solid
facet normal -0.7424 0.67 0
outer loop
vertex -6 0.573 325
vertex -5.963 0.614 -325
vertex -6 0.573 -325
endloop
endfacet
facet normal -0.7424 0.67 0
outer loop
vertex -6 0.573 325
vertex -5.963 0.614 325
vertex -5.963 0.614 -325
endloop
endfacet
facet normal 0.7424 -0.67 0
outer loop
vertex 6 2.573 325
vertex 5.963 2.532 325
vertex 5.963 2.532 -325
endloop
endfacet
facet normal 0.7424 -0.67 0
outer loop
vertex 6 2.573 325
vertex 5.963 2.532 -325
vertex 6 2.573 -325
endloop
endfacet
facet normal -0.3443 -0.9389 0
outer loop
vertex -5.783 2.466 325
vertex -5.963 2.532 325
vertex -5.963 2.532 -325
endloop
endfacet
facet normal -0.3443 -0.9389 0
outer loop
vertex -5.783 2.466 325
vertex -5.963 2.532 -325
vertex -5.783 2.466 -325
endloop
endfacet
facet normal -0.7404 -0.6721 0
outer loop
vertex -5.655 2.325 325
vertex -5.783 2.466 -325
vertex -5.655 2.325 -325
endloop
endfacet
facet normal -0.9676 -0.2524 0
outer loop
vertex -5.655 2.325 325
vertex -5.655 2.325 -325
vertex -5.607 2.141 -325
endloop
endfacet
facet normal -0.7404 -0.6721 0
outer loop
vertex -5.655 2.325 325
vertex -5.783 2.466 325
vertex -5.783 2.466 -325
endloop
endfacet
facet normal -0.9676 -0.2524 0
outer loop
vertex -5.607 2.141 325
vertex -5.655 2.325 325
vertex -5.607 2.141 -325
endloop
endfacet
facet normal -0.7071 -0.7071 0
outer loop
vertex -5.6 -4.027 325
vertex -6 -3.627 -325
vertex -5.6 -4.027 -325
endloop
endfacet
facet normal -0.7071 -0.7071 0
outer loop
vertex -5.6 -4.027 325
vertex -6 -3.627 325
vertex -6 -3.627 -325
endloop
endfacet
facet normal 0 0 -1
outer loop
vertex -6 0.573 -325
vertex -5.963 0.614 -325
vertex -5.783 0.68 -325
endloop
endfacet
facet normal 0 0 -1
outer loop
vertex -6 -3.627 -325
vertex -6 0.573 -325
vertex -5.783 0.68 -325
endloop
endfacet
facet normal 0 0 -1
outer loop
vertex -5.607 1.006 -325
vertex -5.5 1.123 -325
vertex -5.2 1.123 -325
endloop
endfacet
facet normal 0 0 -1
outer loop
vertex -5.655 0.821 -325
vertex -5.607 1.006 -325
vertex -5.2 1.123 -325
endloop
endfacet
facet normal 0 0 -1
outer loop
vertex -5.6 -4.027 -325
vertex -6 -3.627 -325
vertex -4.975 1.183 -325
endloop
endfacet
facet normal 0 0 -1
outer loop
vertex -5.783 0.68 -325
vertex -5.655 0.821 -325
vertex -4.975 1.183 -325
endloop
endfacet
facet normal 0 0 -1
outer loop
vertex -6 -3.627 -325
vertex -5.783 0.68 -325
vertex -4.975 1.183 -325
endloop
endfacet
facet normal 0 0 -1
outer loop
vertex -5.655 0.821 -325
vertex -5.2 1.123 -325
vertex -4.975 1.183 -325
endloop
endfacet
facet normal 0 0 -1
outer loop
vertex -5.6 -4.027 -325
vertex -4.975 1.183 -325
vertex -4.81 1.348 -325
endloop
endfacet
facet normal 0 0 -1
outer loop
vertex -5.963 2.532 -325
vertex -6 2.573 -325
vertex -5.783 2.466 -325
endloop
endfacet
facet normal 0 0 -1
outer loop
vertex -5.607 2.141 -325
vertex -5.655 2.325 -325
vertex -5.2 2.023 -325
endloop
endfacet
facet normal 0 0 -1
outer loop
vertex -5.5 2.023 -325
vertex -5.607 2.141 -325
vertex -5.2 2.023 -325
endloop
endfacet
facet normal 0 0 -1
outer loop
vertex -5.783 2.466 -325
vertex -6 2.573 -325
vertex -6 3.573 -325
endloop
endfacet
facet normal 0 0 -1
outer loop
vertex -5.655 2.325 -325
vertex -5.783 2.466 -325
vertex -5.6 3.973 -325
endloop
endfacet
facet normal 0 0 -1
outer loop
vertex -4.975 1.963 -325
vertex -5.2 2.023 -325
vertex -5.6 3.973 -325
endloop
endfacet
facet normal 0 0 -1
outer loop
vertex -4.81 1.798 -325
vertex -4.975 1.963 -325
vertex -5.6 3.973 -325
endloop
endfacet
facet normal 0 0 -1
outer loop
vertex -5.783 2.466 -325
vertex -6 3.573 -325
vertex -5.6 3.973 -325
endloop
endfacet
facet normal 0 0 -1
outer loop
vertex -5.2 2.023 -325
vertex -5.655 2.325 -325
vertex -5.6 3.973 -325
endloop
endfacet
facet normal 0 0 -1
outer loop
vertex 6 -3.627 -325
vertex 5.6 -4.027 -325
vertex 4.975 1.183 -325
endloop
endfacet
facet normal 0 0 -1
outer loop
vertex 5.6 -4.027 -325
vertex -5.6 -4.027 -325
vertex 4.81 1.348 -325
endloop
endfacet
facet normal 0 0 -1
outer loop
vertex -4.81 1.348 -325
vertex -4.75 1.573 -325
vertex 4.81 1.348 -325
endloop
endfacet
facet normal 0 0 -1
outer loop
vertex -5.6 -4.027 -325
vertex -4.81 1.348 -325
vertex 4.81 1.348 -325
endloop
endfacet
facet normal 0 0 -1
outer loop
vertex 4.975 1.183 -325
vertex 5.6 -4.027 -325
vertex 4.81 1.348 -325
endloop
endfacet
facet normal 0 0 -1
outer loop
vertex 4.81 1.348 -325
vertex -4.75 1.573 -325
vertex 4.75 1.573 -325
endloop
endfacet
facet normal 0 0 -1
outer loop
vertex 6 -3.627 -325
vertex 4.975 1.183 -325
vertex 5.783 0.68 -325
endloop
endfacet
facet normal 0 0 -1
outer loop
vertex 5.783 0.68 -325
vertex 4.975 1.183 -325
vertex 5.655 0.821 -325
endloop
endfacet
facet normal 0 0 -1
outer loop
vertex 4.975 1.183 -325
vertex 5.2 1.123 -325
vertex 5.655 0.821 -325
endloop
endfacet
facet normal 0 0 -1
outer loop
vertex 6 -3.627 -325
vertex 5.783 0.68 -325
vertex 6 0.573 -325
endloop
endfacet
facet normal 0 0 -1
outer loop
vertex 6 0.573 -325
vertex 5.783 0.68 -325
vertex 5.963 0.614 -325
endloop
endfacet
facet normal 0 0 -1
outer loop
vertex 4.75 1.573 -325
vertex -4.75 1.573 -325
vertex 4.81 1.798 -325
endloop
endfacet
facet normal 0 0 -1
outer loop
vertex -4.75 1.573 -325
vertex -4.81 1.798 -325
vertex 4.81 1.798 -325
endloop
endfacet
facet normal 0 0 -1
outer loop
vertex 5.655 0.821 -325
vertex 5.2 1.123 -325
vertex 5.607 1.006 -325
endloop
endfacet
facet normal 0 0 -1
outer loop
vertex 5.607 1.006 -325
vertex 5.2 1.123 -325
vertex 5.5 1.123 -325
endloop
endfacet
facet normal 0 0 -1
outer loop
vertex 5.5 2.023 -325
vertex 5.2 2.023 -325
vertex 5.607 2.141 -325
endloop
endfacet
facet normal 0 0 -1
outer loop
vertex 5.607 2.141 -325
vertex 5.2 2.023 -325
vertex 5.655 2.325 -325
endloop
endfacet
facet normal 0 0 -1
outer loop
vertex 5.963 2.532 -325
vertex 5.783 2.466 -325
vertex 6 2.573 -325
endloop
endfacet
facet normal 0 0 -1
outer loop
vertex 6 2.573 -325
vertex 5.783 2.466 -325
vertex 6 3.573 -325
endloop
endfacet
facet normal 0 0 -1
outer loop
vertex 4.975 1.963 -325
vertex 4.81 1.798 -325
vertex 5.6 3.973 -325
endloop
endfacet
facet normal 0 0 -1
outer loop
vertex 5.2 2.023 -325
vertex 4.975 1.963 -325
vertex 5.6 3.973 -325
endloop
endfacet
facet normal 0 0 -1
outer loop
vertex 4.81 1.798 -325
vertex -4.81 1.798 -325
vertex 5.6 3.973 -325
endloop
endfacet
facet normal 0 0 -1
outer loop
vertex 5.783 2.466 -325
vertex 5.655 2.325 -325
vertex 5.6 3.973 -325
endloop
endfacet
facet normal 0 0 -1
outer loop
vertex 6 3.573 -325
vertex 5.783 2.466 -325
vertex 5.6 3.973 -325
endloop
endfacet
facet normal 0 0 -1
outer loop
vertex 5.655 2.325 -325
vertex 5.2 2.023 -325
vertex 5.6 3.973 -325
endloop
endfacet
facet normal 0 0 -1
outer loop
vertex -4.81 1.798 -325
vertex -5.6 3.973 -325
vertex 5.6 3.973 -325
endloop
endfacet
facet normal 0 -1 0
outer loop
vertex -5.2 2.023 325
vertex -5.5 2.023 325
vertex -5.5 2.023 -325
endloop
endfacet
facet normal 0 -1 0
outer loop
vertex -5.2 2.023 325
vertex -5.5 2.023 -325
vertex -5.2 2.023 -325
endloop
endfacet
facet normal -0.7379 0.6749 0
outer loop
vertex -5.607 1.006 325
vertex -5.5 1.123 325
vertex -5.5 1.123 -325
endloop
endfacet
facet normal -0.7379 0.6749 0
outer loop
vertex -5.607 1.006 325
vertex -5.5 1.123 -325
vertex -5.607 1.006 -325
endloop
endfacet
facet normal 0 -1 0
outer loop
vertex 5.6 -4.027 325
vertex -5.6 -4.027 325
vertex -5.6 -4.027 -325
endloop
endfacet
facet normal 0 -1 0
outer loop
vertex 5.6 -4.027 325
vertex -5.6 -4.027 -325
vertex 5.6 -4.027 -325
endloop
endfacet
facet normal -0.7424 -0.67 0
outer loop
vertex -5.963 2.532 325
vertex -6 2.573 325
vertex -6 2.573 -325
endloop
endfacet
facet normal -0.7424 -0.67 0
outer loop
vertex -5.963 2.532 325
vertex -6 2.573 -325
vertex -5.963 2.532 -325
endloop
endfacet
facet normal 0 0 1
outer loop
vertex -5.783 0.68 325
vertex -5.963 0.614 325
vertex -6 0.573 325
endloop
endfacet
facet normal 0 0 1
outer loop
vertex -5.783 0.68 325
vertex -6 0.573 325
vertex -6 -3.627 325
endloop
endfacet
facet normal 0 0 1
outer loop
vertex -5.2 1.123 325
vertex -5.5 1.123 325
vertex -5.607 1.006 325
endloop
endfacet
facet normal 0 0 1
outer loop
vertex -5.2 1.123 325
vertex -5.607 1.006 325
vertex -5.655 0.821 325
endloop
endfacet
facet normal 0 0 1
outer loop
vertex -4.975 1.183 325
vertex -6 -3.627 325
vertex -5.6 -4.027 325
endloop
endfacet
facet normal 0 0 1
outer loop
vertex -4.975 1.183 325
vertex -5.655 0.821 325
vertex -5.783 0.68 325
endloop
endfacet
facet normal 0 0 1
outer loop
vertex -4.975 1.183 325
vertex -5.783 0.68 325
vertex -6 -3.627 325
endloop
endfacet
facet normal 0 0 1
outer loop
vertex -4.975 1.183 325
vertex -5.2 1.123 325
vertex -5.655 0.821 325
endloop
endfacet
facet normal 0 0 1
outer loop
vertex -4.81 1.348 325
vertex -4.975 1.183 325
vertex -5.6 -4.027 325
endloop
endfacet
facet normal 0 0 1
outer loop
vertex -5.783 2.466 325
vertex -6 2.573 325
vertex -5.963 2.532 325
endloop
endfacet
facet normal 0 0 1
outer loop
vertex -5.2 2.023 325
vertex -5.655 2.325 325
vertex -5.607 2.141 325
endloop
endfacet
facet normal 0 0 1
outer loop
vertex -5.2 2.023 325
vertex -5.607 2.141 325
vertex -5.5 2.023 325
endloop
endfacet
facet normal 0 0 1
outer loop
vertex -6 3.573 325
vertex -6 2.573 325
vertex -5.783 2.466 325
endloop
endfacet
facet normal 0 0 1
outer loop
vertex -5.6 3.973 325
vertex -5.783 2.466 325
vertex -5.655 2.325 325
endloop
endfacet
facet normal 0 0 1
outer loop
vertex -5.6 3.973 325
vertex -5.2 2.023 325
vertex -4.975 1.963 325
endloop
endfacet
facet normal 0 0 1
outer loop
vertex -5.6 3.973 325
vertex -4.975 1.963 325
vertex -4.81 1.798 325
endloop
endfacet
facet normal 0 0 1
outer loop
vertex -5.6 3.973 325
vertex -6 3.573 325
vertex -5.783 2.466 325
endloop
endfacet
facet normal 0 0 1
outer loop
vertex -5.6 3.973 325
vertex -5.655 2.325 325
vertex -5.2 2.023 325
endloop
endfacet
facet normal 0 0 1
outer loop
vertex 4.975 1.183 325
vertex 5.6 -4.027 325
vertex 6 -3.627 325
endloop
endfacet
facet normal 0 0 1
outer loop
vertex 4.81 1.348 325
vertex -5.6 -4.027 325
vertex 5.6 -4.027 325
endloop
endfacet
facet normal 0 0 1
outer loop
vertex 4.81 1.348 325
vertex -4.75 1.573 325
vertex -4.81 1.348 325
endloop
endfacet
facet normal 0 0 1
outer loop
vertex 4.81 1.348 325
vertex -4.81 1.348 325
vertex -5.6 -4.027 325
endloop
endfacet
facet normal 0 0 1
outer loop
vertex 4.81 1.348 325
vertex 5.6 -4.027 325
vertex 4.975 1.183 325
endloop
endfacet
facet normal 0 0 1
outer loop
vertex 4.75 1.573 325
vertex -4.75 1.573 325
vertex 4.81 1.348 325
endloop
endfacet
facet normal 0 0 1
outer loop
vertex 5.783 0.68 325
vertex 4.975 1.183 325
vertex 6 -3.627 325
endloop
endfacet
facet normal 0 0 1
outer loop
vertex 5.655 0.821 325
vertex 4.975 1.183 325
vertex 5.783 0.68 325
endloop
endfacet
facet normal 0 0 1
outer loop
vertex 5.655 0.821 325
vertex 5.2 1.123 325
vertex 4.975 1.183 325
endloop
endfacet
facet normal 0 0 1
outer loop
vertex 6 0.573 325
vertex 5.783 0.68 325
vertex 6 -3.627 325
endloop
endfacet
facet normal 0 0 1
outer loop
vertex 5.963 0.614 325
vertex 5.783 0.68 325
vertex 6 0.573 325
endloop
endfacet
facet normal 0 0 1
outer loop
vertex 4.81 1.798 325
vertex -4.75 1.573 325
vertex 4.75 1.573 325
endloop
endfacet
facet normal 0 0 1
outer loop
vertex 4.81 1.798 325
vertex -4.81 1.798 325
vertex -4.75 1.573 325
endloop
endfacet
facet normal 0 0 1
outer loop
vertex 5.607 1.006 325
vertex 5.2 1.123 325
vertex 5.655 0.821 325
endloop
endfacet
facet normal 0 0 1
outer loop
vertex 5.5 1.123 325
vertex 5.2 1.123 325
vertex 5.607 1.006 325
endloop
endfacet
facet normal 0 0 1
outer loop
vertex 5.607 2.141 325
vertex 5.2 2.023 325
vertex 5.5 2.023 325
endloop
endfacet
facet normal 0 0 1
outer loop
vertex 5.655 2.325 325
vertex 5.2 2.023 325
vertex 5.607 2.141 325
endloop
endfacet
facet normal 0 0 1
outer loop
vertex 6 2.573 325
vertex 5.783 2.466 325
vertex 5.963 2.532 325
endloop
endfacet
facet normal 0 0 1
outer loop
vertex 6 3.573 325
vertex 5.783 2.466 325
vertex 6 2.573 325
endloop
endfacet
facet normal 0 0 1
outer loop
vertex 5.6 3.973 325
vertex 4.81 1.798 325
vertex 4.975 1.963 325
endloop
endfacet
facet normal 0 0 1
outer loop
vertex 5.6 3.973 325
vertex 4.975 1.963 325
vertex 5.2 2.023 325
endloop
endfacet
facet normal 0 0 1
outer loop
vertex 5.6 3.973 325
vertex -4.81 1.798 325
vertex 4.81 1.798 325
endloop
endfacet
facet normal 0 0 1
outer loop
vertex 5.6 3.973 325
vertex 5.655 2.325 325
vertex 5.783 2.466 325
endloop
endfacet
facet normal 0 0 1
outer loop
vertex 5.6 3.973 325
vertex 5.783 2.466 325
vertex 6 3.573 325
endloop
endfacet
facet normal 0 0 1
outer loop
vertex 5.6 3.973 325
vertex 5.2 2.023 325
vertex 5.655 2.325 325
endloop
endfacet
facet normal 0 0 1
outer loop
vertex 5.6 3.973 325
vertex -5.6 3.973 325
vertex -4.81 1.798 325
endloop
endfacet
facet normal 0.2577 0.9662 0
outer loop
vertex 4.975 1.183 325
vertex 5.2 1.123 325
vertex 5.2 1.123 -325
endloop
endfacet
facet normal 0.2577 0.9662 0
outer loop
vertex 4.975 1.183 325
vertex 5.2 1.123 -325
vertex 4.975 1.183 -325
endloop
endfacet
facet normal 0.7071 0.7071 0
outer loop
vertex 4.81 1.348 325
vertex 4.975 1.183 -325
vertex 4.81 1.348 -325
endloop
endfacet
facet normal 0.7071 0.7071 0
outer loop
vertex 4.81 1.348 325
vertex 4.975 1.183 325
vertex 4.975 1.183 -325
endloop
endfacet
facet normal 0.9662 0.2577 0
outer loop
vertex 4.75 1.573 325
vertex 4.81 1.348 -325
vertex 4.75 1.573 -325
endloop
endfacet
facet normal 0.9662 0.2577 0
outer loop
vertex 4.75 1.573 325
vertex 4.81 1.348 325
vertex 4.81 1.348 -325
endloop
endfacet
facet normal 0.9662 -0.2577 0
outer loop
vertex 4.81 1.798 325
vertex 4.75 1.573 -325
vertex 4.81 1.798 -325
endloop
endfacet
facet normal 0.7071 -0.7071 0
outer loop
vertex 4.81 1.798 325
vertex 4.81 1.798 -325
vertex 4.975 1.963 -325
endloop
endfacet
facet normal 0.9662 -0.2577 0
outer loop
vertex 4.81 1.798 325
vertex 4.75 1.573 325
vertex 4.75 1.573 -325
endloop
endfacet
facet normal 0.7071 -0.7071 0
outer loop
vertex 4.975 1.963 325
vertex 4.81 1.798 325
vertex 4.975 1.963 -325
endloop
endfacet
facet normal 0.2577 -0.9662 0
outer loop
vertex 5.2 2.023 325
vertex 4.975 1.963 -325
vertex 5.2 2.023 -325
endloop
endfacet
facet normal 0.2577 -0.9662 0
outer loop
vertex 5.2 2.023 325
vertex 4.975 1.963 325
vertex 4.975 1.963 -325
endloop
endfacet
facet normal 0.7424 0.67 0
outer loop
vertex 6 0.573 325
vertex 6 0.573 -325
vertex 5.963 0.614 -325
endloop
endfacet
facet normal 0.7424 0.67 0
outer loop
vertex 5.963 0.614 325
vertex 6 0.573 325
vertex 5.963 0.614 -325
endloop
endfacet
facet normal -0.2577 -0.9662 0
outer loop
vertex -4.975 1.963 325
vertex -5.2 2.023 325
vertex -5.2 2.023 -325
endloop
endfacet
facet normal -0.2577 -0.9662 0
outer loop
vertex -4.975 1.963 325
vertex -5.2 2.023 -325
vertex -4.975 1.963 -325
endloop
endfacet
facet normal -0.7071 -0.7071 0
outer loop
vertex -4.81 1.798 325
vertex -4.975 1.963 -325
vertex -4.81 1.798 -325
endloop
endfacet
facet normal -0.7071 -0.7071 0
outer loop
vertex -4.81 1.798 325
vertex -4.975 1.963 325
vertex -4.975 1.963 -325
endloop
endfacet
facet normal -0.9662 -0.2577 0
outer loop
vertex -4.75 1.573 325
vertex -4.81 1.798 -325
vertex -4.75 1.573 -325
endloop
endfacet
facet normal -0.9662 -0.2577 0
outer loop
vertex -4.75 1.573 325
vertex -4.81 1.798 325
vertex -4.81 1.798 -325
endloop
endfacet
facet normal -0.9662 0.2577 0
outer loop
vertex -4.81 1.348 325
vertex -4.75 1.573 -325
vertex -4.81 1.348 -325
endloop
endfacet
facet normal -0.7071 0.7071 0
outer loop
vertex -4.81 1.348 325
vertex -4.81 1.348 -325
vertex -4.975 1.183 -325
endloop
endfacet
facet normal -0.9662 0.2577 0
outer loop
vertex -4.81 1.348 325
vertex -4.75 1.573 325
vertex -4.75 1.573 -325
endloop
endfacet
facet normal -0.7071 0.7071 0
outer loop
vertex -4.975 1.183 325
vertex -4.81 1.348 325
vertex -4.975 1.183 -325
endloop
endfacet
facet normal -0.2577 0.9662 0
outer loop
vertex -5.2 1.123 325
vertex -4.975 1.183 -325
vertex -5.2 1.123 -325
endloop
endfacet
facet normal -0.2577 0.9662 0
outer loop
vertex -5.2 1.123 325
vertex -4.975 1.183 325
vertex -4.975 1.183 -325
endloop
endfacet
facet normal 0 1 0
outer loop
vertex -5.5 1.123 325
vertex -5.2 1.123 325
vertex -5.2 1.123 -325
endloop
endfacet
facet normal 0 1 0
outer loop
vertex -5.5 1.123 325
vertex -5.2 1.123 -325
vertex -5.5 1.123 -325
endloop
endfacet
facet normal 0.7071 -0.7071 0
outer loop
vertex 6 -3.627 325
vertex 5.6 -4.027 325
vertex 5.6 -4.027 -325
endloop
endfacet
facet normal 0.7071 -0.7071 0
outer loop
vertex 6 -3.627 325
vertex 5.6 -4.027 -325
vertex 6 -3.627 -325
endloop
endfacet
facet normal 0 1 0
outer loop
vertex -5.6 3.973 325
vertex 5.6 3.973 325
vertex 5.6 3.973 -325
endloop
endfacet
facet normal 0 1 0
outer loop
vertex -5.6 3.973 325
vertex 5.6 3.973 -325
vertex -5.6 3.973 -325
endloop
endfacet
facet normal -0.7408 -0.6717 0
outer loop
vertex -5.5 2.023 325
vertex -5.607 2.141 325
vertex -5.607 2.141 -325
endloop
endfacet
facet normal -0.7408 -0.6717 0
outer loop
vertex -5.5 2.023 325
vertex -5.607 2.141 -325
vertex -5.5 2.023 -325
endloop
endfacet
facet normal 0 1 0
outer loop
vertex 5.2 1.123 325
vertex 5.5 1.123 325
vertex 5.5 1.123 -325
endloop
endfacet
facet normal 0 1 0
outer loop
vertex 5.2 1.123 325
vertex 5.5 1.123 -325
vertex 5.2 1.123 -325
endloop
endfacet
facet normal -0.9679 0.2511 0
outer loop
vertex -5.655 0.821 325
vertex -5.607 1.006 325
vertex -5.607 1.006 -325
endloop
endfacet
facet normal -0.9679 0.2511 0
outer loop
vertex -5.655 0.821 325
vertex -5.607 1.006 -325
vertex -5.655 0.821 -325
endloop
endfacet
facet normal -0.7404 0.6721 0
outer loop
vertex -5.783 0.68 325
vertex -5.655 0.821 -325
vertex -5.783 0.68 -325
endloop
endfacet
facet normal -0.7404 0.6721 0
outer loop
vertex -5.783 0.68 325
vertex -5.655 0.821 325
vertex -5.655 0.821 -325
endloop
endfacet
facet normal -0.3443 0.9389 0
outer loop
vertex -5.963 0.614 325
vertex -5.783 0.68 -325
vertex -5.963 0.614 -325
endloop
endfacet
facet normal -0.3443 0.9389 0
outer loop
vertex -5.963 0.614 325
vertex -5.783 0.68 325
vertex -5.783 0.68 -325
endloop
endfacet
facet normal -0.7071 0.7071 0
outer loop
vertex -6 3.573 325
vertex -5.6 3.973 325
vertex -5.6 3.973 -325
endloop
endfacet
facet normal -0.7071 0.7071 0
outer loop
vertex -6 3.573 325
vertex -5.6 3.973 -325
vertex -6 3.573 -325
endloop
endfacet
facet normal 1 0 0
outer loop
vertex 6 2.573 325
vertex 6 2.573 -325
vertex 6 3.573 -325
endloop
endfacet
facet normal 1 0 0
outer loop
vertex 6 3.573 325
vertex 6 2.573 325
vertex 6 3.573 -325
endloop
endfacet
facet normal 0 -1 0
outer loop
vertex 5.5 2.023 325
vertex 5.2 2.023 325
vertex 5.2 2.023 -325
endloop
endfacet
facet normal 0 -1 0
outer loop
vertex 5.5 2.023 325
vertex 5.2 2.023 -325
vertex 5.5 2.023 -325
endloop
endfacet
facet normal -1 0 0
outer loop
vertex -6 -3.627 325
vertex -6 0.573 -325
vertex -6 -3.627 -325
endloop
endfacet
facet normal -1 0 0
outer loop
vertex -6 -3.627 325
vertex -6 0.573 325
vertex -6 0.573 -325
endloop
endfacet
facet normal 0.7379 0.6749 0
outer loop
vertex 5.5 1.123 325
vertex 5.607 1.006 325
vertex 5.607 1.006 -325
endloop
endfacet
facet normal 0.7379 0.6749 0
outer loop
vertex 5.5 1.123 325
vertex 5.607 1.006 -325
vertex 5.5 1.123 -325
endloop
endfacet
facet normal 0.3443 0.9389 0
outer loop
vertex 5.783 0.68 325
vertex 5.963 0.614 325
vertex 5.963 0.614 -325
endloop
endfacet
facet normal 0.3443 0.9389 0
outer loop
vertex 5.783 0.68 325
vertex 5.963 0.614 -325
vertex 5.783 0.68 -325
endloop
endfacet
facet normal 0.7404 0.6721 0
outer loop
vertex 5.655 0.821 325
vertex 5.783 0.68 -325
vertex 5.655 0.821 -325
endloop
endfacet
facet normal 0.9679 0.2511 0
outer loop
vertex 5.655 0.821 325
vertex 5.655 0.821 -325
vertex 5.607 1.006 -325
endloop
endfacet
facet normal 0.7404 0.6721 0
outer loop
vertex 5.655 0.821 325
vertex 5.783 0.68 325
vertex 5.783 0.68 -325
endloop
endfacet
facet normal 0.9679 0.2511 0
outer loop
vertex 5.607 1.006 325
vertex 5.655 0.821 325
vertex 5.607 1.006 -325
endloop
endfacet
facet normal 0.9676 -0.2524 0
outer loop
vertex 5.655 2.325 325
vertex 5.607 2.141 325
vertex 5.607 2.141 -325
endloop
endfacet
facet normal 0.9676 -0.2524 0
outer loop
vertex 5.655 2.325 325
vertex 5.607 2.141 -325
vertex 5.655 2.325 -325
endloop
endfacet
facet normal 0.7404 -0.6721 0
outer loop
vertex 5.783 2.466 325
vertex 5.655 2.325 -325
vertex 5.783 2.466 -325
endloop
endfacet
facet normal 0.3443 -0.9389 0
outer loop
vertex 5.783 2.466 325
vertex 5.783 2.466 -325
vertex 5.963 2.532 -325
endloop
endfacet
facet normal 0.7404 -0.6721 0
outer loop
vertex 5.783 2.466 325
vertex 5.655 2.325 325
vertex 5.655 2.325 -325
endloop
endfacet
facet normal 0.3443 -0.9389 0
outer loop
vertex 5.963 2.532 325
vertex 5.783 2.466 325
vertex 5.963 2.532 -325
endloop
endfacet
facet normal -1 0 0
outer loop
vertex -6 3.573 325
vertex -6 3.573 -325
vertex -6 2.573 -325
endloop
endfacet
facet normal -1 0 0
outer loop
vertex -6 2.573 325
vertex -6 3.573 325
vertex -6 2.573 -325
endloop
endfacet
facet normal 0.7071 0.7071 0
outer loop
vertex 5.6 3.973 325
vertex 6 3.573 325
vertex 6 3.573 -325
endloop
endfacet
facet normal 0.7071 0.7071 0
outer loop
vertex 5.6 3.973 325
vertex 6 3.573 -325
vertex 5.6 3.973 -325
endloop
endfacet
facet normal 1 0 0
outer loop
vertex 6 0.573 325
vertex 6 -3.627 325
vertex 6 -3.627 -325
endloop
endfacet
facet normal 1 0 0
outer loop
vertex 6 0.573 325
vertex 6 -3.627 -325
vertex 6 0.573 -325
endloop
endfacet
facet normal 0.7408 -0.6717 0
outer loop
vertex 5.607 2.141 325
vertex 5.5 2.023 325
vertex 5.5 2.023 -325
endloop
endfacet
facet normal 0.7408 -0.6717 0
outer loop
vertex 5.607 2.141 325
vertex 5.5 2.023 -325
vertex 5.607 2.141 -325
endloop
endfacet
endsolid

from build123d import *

# Parameters (mm, degrees)
EXTRUDE_289_DEPTH = 325


with BuildPart() as part:
    # Model → Extrude 289 (new, symmetric)
    with BuildSketch(Plane.XY):
        with BuildLine():
            Line((-6.000000002, -3.626884426), (-5.600000002, -4.026884426))
            Line((-5.600000002, -4.026884426), (5.600000002, -4.026884426))
            Line((5.600000002, -4.026884426), (6.000000002, -3.626884426))
            Line((6.000000002, -3.626884426), (6.000000002, 0.573115576))
            Line((6.000000002, 0.573115576), (5.962717201, 0.614126657))
            ThreePointArc((5.962717201, 0.614126657), (5.710750701, 0.74262912), (5.606772215, 1.005666141))
            Line((5.606772215, 1.005666141), (5.500000002, 1.123115576))
            Line((5.500000002, 1.123115576), (5.200000002, 1.123115576))
            ThreePointArc((5.200000002, 1.123115576), (4.750000002, 1.573115576), (5.200000002, 2.023115576))
            Line((5.200000002, 2.023115576), (5.500000002, 2.023115576))
            Line((5.500000002, 2.023115576), (5.606772215, 2.140565011))
            ThreePointArc((5.606772215, 2.140565011), (5.710750701, 2.403602032), (5.962717201, 2.532104495))
            Line((5.962717201, 2.532104495), (6.000000002, 2.573115576))
            Line((6.000000002, 2.573115576), (6.000000002, 3.573115577))
            Line((6.000000002, 3.573115577), (5.600000002, 3.973115577))
            Line((5.600000002, 3.973115577), (-5.600000002, 3.973115577))
            Line((-5.600000002, 3.973115577), (-6.000000002, 3.573115577))
            Line((-6.000000002, 3.573115577), (-6.000000002, 2.573115576))
            Line((-6.000000002, 2.573115576), (-5.962717201, 2.532104495))
            ThreePointArc((-5.962717201, 2.532104495), (-5.710750701, 2.403602032), (-5.606772215, 2.140565011))
            Line((-5.606772215, 2.140565011), (-5.500000002, 2.023115576))
            Line((-5.500000002, 2.023115576), (-5.200000002, 2.023115576))
            ThreePointArc((-5.200000002, 2.023115576), (-4.750000002, 1.573115576), (-5.200000002, 1.123115576))
            Line((-5.200000002, 1.123115576), (-5.500000002, 1.123115576))
            Line((-5.500000002, 1.123115576), (-5.606772215, 1.005666141))
            ThreePointArc((-5.606772215, 1.005666141), (-5.710750701, 0.74262912), (-5.962717201, 0.614126657))
            Line((-5.962717201, 0.614126657), (-6.000000002, 0.573115576))
            Line((-6.000000002, 0.573115576), (-6.000000002, -3.626884426))
        make_face()
    extrude(amount=EXTRUDE_289_DEPTH, both=True)


solid = part.part
